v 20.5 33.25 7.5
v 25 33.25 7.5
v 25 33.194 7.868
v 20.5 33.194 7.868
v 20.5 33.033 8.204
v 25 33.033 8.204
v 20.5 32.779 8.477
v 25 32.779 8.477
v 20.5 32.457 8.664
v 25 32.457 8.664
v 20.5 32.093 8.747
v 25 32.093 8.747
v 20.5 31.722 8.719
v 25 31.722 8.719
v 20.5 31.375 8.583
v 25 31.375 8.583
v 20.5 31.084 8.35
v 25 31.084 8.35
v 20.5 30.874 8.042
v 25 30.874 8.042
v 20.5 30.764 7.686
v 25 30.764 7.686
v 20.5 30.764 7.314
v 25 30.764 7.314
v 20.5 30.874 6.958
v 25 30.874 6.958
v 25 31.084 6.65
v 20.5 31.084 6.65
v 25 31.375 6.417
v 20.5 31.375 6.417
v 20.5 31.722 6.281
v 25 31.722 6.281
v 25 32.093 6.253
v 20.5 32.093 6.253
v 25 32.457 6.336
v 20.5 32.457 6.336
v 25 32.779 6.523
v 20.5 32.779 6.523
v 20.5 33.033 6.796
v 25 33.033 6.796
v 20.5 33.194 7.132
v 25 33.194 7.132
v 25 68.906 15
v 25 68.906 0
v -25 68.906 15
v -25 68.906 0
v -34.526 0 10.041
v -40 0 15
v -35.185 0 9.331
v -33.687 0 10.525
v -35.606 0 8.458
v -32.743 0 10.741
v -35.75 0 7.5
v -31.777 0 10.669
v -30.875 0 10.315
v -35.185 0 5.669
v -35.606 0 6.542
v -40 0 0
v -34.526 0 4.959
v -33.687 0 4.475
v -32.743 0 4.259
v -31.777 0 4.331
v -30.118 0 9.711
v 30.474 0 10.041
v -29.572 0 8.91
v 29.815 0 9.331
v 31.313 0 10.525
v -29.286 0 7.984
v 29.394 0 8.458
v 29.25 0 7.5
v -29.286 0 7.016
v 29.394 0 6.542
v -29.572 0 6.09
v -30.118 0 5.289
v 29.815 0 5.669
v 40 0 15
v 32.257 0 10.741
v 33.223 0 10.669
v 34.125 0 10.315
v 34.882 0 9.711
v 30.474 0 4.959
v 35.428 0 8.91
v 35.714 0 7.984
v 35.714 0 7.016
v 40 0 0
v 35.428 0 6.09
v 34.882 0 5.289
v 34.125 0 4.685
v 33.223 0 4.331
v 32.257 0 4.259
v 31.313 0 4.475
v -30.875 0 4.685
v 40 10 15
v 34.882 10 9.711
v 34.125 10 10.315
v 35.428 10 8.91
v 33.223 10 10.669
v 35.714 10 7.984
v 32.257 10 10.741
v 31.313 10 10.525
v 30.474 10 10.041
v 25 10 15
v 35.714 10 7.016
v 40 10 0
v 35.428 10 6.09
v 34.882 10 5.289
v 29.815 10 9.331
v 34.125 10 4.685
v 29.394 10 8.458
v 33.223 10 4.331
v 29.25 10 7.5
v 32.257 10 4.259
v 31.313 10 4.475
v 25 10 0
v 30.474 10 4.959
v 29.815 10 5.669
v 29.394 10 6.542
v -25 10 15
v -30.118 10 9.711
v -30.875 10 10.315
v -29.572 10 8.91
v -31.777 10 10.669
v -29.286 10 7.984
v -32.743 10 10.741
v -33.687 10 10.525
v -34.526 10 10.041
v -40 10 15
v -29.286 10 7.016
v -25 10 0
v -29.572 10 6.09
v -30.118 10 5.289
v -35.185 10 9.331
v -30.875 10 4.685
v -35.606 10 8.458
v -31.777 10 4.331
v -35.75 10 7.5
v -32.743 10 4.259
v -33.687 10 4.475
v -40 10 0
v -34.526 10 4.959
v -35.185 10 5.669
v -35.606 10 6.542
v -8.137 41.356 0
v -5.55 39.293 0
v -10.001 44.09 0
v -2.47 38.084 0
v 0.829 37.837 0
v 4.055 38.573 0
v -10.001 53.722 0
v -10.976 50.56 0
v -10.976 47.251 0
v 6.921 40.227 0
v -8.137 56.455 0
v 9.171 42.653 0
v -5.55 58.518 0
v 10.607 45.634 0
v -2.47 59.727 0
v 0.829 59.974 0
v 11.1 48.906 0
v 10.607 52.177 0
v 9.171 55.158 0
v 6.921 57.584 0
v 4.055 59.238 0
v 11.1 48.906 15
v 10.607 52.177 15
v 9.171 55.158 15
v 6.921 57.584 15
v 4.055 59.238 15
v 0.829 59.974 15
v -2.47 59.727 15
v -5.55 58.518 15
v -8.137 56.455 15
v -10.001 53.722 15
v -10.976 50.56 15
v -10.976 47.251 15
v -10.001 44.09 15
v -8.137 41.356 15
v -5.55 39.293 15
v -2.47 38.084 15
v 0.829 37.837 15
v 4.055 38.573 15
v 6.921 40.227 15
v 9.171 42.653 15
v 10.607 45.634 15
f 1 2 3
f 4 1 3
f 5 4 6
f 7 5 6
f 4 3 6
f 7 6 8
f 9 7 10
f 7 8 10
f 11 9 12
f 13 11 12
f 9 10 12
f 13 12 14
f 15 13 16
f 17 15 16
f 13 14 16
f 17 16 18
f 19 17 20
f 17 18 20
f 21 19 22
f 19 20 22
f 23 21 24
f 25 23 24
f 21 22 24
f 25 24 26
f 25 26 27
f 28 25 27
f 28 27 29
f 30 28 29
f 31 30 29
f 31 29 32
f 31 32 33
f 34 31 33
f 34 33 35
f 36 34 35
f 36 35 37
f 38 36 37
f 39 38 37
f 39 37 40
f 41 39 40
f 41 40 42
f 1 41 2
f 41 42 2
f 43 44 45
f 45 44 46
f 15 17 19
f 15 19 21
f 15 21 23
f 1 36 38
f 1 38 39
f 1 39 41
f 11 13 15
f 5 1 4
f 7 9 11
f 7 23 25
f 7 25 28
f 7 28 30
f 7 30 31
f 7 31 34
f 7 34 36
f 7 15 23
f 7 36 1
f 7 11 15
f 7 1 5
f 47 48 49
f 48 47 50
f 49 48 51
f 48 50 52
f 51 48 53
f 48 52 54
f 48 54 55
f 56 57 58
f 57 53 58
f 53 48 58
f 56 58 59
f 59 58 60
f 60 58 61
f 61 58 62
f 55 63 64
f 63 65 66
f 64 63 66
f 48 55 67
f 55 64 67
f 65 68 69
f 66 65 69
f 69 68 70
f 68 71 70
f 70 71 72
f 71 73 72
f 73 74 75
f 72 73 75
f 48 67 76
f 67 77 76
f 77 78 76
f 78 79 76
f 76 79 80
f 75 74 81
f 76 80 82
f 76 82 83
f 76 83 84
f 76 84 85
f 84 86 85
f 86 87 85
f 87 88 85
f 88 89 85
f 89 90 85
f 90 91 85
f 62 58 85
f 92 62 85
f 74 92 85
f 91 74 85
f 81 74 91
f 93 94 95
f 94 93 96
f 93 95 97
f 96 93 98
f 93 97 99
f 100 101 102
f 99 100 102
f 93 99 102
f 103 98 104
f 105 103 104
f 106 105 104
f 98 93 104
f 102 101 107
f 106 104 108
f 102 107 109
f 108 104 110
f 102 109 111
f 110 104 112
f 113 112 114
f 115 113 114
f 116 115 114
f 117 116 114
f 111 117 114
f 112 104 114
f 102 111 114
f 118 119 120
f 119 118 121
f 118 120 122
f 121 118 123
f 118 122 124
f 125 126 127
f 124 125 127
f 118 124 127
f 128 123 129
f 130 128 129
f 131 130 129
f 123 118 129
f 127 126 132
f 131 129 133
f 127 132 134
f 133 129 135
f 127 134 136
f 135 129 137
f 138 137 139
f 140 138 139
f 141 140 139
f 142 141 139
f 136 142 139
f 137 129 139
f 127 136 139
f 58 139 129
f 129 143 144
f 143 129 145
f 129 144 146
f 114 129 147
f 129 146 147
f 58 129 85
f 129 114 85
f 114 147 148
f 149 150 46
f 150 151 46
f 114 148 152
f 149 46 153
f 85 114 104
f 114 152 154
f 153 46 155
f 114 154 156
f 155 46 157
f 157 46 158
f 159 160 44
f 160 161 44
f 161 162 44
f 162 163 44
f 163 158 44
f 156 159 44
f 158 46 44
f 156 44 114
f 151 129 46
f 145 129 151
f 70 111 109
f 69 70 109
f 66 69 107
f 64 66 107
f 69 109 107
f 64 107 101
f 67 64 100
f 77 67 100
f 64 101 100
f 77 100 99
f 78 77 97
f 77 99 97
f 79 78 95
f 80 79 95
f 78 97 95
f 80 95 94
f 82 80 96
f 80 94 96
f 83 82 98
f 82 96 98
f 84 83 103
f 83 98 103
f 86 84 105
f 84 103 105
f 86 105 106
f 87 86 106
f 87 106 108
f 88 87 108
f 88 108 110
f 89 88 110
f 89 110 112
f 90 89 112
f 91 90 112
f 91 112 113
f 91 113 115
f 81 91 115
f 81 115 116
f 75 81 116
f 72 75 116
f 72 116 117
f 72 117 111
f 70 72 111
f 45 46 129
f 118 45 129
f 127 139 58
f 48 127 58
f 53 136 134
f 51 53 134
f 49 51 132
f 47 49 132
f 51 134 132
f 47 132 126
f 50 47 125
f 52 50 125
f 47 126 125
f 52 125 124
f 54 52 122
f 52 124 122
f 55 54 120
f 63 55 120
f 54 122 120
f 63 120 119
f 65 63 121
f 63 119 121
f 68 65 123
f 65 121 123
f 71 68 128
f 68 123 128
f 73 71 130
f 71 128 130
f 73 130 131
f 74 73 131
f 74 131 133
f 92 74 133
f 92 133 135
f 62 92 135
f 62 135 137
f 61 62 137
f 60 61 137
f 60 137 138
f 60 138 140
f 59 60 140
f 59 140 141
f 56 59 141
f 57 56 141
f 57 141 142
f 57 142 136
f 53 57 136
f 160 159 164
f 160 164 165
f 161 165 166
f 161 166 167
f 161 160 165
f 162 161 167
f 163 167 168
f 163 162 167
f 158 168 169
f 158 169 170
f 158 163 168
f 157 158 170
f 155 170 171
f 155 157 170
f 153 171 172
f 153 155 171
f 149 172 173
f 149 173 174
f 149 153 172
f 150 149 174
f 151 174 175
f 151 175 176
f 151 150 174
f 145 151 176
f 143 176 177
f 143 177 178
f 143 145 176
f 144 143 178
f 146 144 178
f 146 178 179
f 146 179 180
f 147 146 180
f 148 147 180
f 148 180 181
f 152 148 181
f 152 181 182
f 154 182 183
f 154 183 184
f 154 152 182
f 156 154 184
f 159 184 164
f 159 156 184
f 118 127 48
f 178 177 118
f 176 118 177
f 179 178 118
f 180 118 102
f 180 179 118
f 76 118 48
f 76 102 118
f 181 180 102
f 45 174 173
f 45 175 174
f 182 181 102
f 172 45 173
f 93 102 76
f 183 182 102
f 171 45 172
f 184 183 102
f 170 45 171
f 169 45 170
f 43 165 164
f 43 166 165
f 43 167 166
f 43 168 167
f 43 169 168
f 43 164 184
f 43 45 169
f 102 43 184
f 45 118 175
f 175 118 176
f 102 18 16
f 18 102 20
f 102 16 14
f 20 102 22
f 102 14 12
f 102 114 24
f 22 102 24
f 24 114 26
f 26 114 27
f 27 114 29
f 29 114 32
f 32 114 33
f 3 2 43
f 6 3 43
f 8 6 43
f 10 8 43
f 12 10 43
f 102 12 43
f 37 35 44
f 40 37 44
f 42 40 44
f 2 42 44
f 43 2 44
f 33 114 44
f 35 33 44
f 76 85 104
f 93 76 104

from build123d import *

# Parameters (mm, degrees)
SKETCH1_R           = 11.0998
BOSS_EXTRUDE1_DEPTH = 15
SKETCH2_R           = 3.25
CUT_EXTRUDE1_DEPTH  = 73.765855395
SKETCH3_R           = 1.25
CUT_EXTRUDE2_DEPTH  = 4.5


with BuildPart() as part:
    # Sketch1 → Boss-Extrude1 (new body)
    with BuildSketch(Plane.XY):
        Polygon((-40, 0), (40, 0), (40, 10), (25, 10), (25, 68.9056), (-25, 68.9056), (-25, 10), (-40, 10), align=None)
        with Locations((0, 48.9056)):
            Circle(SKETCH1_R, mode=Mode.SUBTRACT)
    extrude(amount=BOSS_EXTRUDE1_DEPTH)

    # Sketch2 → Cut-Extrude1 (cut, through all)
    with BuildSketch(Plane(origin=(0, 10, 0), x_dir=(1, 0, 0), z_dir=(0, 1, 0))):
        with Locations(Location((-32.5, -7.5, 0), (0, 0, 180))):
            Circle(SKETCH2_R)
        with Locations(Location((32.5, -7.5, 0), (0, 0, 180))):
            Circle(SKETCH2_R)
    extrude(amount=-CUT_EXTRUDE1_DEPTH, mode=Mode.SUBTRACT)

    # Sketch3 → Cut-Extrude2 (cut)
    with BuildSketch(Plane(origin=(25, 0, 0), x_dir=(0, 0, -1), z_dir=(1, 0, 0))):
        with Locations(Location((-7.5, 32, 0), (0, 0, 90))):
            Circle(SKETCH3_R)
    extrude(amount=-CUT_EXTRUDE2_DEPTH, mode=Mode.SUBTRACT)


solid = part.part
